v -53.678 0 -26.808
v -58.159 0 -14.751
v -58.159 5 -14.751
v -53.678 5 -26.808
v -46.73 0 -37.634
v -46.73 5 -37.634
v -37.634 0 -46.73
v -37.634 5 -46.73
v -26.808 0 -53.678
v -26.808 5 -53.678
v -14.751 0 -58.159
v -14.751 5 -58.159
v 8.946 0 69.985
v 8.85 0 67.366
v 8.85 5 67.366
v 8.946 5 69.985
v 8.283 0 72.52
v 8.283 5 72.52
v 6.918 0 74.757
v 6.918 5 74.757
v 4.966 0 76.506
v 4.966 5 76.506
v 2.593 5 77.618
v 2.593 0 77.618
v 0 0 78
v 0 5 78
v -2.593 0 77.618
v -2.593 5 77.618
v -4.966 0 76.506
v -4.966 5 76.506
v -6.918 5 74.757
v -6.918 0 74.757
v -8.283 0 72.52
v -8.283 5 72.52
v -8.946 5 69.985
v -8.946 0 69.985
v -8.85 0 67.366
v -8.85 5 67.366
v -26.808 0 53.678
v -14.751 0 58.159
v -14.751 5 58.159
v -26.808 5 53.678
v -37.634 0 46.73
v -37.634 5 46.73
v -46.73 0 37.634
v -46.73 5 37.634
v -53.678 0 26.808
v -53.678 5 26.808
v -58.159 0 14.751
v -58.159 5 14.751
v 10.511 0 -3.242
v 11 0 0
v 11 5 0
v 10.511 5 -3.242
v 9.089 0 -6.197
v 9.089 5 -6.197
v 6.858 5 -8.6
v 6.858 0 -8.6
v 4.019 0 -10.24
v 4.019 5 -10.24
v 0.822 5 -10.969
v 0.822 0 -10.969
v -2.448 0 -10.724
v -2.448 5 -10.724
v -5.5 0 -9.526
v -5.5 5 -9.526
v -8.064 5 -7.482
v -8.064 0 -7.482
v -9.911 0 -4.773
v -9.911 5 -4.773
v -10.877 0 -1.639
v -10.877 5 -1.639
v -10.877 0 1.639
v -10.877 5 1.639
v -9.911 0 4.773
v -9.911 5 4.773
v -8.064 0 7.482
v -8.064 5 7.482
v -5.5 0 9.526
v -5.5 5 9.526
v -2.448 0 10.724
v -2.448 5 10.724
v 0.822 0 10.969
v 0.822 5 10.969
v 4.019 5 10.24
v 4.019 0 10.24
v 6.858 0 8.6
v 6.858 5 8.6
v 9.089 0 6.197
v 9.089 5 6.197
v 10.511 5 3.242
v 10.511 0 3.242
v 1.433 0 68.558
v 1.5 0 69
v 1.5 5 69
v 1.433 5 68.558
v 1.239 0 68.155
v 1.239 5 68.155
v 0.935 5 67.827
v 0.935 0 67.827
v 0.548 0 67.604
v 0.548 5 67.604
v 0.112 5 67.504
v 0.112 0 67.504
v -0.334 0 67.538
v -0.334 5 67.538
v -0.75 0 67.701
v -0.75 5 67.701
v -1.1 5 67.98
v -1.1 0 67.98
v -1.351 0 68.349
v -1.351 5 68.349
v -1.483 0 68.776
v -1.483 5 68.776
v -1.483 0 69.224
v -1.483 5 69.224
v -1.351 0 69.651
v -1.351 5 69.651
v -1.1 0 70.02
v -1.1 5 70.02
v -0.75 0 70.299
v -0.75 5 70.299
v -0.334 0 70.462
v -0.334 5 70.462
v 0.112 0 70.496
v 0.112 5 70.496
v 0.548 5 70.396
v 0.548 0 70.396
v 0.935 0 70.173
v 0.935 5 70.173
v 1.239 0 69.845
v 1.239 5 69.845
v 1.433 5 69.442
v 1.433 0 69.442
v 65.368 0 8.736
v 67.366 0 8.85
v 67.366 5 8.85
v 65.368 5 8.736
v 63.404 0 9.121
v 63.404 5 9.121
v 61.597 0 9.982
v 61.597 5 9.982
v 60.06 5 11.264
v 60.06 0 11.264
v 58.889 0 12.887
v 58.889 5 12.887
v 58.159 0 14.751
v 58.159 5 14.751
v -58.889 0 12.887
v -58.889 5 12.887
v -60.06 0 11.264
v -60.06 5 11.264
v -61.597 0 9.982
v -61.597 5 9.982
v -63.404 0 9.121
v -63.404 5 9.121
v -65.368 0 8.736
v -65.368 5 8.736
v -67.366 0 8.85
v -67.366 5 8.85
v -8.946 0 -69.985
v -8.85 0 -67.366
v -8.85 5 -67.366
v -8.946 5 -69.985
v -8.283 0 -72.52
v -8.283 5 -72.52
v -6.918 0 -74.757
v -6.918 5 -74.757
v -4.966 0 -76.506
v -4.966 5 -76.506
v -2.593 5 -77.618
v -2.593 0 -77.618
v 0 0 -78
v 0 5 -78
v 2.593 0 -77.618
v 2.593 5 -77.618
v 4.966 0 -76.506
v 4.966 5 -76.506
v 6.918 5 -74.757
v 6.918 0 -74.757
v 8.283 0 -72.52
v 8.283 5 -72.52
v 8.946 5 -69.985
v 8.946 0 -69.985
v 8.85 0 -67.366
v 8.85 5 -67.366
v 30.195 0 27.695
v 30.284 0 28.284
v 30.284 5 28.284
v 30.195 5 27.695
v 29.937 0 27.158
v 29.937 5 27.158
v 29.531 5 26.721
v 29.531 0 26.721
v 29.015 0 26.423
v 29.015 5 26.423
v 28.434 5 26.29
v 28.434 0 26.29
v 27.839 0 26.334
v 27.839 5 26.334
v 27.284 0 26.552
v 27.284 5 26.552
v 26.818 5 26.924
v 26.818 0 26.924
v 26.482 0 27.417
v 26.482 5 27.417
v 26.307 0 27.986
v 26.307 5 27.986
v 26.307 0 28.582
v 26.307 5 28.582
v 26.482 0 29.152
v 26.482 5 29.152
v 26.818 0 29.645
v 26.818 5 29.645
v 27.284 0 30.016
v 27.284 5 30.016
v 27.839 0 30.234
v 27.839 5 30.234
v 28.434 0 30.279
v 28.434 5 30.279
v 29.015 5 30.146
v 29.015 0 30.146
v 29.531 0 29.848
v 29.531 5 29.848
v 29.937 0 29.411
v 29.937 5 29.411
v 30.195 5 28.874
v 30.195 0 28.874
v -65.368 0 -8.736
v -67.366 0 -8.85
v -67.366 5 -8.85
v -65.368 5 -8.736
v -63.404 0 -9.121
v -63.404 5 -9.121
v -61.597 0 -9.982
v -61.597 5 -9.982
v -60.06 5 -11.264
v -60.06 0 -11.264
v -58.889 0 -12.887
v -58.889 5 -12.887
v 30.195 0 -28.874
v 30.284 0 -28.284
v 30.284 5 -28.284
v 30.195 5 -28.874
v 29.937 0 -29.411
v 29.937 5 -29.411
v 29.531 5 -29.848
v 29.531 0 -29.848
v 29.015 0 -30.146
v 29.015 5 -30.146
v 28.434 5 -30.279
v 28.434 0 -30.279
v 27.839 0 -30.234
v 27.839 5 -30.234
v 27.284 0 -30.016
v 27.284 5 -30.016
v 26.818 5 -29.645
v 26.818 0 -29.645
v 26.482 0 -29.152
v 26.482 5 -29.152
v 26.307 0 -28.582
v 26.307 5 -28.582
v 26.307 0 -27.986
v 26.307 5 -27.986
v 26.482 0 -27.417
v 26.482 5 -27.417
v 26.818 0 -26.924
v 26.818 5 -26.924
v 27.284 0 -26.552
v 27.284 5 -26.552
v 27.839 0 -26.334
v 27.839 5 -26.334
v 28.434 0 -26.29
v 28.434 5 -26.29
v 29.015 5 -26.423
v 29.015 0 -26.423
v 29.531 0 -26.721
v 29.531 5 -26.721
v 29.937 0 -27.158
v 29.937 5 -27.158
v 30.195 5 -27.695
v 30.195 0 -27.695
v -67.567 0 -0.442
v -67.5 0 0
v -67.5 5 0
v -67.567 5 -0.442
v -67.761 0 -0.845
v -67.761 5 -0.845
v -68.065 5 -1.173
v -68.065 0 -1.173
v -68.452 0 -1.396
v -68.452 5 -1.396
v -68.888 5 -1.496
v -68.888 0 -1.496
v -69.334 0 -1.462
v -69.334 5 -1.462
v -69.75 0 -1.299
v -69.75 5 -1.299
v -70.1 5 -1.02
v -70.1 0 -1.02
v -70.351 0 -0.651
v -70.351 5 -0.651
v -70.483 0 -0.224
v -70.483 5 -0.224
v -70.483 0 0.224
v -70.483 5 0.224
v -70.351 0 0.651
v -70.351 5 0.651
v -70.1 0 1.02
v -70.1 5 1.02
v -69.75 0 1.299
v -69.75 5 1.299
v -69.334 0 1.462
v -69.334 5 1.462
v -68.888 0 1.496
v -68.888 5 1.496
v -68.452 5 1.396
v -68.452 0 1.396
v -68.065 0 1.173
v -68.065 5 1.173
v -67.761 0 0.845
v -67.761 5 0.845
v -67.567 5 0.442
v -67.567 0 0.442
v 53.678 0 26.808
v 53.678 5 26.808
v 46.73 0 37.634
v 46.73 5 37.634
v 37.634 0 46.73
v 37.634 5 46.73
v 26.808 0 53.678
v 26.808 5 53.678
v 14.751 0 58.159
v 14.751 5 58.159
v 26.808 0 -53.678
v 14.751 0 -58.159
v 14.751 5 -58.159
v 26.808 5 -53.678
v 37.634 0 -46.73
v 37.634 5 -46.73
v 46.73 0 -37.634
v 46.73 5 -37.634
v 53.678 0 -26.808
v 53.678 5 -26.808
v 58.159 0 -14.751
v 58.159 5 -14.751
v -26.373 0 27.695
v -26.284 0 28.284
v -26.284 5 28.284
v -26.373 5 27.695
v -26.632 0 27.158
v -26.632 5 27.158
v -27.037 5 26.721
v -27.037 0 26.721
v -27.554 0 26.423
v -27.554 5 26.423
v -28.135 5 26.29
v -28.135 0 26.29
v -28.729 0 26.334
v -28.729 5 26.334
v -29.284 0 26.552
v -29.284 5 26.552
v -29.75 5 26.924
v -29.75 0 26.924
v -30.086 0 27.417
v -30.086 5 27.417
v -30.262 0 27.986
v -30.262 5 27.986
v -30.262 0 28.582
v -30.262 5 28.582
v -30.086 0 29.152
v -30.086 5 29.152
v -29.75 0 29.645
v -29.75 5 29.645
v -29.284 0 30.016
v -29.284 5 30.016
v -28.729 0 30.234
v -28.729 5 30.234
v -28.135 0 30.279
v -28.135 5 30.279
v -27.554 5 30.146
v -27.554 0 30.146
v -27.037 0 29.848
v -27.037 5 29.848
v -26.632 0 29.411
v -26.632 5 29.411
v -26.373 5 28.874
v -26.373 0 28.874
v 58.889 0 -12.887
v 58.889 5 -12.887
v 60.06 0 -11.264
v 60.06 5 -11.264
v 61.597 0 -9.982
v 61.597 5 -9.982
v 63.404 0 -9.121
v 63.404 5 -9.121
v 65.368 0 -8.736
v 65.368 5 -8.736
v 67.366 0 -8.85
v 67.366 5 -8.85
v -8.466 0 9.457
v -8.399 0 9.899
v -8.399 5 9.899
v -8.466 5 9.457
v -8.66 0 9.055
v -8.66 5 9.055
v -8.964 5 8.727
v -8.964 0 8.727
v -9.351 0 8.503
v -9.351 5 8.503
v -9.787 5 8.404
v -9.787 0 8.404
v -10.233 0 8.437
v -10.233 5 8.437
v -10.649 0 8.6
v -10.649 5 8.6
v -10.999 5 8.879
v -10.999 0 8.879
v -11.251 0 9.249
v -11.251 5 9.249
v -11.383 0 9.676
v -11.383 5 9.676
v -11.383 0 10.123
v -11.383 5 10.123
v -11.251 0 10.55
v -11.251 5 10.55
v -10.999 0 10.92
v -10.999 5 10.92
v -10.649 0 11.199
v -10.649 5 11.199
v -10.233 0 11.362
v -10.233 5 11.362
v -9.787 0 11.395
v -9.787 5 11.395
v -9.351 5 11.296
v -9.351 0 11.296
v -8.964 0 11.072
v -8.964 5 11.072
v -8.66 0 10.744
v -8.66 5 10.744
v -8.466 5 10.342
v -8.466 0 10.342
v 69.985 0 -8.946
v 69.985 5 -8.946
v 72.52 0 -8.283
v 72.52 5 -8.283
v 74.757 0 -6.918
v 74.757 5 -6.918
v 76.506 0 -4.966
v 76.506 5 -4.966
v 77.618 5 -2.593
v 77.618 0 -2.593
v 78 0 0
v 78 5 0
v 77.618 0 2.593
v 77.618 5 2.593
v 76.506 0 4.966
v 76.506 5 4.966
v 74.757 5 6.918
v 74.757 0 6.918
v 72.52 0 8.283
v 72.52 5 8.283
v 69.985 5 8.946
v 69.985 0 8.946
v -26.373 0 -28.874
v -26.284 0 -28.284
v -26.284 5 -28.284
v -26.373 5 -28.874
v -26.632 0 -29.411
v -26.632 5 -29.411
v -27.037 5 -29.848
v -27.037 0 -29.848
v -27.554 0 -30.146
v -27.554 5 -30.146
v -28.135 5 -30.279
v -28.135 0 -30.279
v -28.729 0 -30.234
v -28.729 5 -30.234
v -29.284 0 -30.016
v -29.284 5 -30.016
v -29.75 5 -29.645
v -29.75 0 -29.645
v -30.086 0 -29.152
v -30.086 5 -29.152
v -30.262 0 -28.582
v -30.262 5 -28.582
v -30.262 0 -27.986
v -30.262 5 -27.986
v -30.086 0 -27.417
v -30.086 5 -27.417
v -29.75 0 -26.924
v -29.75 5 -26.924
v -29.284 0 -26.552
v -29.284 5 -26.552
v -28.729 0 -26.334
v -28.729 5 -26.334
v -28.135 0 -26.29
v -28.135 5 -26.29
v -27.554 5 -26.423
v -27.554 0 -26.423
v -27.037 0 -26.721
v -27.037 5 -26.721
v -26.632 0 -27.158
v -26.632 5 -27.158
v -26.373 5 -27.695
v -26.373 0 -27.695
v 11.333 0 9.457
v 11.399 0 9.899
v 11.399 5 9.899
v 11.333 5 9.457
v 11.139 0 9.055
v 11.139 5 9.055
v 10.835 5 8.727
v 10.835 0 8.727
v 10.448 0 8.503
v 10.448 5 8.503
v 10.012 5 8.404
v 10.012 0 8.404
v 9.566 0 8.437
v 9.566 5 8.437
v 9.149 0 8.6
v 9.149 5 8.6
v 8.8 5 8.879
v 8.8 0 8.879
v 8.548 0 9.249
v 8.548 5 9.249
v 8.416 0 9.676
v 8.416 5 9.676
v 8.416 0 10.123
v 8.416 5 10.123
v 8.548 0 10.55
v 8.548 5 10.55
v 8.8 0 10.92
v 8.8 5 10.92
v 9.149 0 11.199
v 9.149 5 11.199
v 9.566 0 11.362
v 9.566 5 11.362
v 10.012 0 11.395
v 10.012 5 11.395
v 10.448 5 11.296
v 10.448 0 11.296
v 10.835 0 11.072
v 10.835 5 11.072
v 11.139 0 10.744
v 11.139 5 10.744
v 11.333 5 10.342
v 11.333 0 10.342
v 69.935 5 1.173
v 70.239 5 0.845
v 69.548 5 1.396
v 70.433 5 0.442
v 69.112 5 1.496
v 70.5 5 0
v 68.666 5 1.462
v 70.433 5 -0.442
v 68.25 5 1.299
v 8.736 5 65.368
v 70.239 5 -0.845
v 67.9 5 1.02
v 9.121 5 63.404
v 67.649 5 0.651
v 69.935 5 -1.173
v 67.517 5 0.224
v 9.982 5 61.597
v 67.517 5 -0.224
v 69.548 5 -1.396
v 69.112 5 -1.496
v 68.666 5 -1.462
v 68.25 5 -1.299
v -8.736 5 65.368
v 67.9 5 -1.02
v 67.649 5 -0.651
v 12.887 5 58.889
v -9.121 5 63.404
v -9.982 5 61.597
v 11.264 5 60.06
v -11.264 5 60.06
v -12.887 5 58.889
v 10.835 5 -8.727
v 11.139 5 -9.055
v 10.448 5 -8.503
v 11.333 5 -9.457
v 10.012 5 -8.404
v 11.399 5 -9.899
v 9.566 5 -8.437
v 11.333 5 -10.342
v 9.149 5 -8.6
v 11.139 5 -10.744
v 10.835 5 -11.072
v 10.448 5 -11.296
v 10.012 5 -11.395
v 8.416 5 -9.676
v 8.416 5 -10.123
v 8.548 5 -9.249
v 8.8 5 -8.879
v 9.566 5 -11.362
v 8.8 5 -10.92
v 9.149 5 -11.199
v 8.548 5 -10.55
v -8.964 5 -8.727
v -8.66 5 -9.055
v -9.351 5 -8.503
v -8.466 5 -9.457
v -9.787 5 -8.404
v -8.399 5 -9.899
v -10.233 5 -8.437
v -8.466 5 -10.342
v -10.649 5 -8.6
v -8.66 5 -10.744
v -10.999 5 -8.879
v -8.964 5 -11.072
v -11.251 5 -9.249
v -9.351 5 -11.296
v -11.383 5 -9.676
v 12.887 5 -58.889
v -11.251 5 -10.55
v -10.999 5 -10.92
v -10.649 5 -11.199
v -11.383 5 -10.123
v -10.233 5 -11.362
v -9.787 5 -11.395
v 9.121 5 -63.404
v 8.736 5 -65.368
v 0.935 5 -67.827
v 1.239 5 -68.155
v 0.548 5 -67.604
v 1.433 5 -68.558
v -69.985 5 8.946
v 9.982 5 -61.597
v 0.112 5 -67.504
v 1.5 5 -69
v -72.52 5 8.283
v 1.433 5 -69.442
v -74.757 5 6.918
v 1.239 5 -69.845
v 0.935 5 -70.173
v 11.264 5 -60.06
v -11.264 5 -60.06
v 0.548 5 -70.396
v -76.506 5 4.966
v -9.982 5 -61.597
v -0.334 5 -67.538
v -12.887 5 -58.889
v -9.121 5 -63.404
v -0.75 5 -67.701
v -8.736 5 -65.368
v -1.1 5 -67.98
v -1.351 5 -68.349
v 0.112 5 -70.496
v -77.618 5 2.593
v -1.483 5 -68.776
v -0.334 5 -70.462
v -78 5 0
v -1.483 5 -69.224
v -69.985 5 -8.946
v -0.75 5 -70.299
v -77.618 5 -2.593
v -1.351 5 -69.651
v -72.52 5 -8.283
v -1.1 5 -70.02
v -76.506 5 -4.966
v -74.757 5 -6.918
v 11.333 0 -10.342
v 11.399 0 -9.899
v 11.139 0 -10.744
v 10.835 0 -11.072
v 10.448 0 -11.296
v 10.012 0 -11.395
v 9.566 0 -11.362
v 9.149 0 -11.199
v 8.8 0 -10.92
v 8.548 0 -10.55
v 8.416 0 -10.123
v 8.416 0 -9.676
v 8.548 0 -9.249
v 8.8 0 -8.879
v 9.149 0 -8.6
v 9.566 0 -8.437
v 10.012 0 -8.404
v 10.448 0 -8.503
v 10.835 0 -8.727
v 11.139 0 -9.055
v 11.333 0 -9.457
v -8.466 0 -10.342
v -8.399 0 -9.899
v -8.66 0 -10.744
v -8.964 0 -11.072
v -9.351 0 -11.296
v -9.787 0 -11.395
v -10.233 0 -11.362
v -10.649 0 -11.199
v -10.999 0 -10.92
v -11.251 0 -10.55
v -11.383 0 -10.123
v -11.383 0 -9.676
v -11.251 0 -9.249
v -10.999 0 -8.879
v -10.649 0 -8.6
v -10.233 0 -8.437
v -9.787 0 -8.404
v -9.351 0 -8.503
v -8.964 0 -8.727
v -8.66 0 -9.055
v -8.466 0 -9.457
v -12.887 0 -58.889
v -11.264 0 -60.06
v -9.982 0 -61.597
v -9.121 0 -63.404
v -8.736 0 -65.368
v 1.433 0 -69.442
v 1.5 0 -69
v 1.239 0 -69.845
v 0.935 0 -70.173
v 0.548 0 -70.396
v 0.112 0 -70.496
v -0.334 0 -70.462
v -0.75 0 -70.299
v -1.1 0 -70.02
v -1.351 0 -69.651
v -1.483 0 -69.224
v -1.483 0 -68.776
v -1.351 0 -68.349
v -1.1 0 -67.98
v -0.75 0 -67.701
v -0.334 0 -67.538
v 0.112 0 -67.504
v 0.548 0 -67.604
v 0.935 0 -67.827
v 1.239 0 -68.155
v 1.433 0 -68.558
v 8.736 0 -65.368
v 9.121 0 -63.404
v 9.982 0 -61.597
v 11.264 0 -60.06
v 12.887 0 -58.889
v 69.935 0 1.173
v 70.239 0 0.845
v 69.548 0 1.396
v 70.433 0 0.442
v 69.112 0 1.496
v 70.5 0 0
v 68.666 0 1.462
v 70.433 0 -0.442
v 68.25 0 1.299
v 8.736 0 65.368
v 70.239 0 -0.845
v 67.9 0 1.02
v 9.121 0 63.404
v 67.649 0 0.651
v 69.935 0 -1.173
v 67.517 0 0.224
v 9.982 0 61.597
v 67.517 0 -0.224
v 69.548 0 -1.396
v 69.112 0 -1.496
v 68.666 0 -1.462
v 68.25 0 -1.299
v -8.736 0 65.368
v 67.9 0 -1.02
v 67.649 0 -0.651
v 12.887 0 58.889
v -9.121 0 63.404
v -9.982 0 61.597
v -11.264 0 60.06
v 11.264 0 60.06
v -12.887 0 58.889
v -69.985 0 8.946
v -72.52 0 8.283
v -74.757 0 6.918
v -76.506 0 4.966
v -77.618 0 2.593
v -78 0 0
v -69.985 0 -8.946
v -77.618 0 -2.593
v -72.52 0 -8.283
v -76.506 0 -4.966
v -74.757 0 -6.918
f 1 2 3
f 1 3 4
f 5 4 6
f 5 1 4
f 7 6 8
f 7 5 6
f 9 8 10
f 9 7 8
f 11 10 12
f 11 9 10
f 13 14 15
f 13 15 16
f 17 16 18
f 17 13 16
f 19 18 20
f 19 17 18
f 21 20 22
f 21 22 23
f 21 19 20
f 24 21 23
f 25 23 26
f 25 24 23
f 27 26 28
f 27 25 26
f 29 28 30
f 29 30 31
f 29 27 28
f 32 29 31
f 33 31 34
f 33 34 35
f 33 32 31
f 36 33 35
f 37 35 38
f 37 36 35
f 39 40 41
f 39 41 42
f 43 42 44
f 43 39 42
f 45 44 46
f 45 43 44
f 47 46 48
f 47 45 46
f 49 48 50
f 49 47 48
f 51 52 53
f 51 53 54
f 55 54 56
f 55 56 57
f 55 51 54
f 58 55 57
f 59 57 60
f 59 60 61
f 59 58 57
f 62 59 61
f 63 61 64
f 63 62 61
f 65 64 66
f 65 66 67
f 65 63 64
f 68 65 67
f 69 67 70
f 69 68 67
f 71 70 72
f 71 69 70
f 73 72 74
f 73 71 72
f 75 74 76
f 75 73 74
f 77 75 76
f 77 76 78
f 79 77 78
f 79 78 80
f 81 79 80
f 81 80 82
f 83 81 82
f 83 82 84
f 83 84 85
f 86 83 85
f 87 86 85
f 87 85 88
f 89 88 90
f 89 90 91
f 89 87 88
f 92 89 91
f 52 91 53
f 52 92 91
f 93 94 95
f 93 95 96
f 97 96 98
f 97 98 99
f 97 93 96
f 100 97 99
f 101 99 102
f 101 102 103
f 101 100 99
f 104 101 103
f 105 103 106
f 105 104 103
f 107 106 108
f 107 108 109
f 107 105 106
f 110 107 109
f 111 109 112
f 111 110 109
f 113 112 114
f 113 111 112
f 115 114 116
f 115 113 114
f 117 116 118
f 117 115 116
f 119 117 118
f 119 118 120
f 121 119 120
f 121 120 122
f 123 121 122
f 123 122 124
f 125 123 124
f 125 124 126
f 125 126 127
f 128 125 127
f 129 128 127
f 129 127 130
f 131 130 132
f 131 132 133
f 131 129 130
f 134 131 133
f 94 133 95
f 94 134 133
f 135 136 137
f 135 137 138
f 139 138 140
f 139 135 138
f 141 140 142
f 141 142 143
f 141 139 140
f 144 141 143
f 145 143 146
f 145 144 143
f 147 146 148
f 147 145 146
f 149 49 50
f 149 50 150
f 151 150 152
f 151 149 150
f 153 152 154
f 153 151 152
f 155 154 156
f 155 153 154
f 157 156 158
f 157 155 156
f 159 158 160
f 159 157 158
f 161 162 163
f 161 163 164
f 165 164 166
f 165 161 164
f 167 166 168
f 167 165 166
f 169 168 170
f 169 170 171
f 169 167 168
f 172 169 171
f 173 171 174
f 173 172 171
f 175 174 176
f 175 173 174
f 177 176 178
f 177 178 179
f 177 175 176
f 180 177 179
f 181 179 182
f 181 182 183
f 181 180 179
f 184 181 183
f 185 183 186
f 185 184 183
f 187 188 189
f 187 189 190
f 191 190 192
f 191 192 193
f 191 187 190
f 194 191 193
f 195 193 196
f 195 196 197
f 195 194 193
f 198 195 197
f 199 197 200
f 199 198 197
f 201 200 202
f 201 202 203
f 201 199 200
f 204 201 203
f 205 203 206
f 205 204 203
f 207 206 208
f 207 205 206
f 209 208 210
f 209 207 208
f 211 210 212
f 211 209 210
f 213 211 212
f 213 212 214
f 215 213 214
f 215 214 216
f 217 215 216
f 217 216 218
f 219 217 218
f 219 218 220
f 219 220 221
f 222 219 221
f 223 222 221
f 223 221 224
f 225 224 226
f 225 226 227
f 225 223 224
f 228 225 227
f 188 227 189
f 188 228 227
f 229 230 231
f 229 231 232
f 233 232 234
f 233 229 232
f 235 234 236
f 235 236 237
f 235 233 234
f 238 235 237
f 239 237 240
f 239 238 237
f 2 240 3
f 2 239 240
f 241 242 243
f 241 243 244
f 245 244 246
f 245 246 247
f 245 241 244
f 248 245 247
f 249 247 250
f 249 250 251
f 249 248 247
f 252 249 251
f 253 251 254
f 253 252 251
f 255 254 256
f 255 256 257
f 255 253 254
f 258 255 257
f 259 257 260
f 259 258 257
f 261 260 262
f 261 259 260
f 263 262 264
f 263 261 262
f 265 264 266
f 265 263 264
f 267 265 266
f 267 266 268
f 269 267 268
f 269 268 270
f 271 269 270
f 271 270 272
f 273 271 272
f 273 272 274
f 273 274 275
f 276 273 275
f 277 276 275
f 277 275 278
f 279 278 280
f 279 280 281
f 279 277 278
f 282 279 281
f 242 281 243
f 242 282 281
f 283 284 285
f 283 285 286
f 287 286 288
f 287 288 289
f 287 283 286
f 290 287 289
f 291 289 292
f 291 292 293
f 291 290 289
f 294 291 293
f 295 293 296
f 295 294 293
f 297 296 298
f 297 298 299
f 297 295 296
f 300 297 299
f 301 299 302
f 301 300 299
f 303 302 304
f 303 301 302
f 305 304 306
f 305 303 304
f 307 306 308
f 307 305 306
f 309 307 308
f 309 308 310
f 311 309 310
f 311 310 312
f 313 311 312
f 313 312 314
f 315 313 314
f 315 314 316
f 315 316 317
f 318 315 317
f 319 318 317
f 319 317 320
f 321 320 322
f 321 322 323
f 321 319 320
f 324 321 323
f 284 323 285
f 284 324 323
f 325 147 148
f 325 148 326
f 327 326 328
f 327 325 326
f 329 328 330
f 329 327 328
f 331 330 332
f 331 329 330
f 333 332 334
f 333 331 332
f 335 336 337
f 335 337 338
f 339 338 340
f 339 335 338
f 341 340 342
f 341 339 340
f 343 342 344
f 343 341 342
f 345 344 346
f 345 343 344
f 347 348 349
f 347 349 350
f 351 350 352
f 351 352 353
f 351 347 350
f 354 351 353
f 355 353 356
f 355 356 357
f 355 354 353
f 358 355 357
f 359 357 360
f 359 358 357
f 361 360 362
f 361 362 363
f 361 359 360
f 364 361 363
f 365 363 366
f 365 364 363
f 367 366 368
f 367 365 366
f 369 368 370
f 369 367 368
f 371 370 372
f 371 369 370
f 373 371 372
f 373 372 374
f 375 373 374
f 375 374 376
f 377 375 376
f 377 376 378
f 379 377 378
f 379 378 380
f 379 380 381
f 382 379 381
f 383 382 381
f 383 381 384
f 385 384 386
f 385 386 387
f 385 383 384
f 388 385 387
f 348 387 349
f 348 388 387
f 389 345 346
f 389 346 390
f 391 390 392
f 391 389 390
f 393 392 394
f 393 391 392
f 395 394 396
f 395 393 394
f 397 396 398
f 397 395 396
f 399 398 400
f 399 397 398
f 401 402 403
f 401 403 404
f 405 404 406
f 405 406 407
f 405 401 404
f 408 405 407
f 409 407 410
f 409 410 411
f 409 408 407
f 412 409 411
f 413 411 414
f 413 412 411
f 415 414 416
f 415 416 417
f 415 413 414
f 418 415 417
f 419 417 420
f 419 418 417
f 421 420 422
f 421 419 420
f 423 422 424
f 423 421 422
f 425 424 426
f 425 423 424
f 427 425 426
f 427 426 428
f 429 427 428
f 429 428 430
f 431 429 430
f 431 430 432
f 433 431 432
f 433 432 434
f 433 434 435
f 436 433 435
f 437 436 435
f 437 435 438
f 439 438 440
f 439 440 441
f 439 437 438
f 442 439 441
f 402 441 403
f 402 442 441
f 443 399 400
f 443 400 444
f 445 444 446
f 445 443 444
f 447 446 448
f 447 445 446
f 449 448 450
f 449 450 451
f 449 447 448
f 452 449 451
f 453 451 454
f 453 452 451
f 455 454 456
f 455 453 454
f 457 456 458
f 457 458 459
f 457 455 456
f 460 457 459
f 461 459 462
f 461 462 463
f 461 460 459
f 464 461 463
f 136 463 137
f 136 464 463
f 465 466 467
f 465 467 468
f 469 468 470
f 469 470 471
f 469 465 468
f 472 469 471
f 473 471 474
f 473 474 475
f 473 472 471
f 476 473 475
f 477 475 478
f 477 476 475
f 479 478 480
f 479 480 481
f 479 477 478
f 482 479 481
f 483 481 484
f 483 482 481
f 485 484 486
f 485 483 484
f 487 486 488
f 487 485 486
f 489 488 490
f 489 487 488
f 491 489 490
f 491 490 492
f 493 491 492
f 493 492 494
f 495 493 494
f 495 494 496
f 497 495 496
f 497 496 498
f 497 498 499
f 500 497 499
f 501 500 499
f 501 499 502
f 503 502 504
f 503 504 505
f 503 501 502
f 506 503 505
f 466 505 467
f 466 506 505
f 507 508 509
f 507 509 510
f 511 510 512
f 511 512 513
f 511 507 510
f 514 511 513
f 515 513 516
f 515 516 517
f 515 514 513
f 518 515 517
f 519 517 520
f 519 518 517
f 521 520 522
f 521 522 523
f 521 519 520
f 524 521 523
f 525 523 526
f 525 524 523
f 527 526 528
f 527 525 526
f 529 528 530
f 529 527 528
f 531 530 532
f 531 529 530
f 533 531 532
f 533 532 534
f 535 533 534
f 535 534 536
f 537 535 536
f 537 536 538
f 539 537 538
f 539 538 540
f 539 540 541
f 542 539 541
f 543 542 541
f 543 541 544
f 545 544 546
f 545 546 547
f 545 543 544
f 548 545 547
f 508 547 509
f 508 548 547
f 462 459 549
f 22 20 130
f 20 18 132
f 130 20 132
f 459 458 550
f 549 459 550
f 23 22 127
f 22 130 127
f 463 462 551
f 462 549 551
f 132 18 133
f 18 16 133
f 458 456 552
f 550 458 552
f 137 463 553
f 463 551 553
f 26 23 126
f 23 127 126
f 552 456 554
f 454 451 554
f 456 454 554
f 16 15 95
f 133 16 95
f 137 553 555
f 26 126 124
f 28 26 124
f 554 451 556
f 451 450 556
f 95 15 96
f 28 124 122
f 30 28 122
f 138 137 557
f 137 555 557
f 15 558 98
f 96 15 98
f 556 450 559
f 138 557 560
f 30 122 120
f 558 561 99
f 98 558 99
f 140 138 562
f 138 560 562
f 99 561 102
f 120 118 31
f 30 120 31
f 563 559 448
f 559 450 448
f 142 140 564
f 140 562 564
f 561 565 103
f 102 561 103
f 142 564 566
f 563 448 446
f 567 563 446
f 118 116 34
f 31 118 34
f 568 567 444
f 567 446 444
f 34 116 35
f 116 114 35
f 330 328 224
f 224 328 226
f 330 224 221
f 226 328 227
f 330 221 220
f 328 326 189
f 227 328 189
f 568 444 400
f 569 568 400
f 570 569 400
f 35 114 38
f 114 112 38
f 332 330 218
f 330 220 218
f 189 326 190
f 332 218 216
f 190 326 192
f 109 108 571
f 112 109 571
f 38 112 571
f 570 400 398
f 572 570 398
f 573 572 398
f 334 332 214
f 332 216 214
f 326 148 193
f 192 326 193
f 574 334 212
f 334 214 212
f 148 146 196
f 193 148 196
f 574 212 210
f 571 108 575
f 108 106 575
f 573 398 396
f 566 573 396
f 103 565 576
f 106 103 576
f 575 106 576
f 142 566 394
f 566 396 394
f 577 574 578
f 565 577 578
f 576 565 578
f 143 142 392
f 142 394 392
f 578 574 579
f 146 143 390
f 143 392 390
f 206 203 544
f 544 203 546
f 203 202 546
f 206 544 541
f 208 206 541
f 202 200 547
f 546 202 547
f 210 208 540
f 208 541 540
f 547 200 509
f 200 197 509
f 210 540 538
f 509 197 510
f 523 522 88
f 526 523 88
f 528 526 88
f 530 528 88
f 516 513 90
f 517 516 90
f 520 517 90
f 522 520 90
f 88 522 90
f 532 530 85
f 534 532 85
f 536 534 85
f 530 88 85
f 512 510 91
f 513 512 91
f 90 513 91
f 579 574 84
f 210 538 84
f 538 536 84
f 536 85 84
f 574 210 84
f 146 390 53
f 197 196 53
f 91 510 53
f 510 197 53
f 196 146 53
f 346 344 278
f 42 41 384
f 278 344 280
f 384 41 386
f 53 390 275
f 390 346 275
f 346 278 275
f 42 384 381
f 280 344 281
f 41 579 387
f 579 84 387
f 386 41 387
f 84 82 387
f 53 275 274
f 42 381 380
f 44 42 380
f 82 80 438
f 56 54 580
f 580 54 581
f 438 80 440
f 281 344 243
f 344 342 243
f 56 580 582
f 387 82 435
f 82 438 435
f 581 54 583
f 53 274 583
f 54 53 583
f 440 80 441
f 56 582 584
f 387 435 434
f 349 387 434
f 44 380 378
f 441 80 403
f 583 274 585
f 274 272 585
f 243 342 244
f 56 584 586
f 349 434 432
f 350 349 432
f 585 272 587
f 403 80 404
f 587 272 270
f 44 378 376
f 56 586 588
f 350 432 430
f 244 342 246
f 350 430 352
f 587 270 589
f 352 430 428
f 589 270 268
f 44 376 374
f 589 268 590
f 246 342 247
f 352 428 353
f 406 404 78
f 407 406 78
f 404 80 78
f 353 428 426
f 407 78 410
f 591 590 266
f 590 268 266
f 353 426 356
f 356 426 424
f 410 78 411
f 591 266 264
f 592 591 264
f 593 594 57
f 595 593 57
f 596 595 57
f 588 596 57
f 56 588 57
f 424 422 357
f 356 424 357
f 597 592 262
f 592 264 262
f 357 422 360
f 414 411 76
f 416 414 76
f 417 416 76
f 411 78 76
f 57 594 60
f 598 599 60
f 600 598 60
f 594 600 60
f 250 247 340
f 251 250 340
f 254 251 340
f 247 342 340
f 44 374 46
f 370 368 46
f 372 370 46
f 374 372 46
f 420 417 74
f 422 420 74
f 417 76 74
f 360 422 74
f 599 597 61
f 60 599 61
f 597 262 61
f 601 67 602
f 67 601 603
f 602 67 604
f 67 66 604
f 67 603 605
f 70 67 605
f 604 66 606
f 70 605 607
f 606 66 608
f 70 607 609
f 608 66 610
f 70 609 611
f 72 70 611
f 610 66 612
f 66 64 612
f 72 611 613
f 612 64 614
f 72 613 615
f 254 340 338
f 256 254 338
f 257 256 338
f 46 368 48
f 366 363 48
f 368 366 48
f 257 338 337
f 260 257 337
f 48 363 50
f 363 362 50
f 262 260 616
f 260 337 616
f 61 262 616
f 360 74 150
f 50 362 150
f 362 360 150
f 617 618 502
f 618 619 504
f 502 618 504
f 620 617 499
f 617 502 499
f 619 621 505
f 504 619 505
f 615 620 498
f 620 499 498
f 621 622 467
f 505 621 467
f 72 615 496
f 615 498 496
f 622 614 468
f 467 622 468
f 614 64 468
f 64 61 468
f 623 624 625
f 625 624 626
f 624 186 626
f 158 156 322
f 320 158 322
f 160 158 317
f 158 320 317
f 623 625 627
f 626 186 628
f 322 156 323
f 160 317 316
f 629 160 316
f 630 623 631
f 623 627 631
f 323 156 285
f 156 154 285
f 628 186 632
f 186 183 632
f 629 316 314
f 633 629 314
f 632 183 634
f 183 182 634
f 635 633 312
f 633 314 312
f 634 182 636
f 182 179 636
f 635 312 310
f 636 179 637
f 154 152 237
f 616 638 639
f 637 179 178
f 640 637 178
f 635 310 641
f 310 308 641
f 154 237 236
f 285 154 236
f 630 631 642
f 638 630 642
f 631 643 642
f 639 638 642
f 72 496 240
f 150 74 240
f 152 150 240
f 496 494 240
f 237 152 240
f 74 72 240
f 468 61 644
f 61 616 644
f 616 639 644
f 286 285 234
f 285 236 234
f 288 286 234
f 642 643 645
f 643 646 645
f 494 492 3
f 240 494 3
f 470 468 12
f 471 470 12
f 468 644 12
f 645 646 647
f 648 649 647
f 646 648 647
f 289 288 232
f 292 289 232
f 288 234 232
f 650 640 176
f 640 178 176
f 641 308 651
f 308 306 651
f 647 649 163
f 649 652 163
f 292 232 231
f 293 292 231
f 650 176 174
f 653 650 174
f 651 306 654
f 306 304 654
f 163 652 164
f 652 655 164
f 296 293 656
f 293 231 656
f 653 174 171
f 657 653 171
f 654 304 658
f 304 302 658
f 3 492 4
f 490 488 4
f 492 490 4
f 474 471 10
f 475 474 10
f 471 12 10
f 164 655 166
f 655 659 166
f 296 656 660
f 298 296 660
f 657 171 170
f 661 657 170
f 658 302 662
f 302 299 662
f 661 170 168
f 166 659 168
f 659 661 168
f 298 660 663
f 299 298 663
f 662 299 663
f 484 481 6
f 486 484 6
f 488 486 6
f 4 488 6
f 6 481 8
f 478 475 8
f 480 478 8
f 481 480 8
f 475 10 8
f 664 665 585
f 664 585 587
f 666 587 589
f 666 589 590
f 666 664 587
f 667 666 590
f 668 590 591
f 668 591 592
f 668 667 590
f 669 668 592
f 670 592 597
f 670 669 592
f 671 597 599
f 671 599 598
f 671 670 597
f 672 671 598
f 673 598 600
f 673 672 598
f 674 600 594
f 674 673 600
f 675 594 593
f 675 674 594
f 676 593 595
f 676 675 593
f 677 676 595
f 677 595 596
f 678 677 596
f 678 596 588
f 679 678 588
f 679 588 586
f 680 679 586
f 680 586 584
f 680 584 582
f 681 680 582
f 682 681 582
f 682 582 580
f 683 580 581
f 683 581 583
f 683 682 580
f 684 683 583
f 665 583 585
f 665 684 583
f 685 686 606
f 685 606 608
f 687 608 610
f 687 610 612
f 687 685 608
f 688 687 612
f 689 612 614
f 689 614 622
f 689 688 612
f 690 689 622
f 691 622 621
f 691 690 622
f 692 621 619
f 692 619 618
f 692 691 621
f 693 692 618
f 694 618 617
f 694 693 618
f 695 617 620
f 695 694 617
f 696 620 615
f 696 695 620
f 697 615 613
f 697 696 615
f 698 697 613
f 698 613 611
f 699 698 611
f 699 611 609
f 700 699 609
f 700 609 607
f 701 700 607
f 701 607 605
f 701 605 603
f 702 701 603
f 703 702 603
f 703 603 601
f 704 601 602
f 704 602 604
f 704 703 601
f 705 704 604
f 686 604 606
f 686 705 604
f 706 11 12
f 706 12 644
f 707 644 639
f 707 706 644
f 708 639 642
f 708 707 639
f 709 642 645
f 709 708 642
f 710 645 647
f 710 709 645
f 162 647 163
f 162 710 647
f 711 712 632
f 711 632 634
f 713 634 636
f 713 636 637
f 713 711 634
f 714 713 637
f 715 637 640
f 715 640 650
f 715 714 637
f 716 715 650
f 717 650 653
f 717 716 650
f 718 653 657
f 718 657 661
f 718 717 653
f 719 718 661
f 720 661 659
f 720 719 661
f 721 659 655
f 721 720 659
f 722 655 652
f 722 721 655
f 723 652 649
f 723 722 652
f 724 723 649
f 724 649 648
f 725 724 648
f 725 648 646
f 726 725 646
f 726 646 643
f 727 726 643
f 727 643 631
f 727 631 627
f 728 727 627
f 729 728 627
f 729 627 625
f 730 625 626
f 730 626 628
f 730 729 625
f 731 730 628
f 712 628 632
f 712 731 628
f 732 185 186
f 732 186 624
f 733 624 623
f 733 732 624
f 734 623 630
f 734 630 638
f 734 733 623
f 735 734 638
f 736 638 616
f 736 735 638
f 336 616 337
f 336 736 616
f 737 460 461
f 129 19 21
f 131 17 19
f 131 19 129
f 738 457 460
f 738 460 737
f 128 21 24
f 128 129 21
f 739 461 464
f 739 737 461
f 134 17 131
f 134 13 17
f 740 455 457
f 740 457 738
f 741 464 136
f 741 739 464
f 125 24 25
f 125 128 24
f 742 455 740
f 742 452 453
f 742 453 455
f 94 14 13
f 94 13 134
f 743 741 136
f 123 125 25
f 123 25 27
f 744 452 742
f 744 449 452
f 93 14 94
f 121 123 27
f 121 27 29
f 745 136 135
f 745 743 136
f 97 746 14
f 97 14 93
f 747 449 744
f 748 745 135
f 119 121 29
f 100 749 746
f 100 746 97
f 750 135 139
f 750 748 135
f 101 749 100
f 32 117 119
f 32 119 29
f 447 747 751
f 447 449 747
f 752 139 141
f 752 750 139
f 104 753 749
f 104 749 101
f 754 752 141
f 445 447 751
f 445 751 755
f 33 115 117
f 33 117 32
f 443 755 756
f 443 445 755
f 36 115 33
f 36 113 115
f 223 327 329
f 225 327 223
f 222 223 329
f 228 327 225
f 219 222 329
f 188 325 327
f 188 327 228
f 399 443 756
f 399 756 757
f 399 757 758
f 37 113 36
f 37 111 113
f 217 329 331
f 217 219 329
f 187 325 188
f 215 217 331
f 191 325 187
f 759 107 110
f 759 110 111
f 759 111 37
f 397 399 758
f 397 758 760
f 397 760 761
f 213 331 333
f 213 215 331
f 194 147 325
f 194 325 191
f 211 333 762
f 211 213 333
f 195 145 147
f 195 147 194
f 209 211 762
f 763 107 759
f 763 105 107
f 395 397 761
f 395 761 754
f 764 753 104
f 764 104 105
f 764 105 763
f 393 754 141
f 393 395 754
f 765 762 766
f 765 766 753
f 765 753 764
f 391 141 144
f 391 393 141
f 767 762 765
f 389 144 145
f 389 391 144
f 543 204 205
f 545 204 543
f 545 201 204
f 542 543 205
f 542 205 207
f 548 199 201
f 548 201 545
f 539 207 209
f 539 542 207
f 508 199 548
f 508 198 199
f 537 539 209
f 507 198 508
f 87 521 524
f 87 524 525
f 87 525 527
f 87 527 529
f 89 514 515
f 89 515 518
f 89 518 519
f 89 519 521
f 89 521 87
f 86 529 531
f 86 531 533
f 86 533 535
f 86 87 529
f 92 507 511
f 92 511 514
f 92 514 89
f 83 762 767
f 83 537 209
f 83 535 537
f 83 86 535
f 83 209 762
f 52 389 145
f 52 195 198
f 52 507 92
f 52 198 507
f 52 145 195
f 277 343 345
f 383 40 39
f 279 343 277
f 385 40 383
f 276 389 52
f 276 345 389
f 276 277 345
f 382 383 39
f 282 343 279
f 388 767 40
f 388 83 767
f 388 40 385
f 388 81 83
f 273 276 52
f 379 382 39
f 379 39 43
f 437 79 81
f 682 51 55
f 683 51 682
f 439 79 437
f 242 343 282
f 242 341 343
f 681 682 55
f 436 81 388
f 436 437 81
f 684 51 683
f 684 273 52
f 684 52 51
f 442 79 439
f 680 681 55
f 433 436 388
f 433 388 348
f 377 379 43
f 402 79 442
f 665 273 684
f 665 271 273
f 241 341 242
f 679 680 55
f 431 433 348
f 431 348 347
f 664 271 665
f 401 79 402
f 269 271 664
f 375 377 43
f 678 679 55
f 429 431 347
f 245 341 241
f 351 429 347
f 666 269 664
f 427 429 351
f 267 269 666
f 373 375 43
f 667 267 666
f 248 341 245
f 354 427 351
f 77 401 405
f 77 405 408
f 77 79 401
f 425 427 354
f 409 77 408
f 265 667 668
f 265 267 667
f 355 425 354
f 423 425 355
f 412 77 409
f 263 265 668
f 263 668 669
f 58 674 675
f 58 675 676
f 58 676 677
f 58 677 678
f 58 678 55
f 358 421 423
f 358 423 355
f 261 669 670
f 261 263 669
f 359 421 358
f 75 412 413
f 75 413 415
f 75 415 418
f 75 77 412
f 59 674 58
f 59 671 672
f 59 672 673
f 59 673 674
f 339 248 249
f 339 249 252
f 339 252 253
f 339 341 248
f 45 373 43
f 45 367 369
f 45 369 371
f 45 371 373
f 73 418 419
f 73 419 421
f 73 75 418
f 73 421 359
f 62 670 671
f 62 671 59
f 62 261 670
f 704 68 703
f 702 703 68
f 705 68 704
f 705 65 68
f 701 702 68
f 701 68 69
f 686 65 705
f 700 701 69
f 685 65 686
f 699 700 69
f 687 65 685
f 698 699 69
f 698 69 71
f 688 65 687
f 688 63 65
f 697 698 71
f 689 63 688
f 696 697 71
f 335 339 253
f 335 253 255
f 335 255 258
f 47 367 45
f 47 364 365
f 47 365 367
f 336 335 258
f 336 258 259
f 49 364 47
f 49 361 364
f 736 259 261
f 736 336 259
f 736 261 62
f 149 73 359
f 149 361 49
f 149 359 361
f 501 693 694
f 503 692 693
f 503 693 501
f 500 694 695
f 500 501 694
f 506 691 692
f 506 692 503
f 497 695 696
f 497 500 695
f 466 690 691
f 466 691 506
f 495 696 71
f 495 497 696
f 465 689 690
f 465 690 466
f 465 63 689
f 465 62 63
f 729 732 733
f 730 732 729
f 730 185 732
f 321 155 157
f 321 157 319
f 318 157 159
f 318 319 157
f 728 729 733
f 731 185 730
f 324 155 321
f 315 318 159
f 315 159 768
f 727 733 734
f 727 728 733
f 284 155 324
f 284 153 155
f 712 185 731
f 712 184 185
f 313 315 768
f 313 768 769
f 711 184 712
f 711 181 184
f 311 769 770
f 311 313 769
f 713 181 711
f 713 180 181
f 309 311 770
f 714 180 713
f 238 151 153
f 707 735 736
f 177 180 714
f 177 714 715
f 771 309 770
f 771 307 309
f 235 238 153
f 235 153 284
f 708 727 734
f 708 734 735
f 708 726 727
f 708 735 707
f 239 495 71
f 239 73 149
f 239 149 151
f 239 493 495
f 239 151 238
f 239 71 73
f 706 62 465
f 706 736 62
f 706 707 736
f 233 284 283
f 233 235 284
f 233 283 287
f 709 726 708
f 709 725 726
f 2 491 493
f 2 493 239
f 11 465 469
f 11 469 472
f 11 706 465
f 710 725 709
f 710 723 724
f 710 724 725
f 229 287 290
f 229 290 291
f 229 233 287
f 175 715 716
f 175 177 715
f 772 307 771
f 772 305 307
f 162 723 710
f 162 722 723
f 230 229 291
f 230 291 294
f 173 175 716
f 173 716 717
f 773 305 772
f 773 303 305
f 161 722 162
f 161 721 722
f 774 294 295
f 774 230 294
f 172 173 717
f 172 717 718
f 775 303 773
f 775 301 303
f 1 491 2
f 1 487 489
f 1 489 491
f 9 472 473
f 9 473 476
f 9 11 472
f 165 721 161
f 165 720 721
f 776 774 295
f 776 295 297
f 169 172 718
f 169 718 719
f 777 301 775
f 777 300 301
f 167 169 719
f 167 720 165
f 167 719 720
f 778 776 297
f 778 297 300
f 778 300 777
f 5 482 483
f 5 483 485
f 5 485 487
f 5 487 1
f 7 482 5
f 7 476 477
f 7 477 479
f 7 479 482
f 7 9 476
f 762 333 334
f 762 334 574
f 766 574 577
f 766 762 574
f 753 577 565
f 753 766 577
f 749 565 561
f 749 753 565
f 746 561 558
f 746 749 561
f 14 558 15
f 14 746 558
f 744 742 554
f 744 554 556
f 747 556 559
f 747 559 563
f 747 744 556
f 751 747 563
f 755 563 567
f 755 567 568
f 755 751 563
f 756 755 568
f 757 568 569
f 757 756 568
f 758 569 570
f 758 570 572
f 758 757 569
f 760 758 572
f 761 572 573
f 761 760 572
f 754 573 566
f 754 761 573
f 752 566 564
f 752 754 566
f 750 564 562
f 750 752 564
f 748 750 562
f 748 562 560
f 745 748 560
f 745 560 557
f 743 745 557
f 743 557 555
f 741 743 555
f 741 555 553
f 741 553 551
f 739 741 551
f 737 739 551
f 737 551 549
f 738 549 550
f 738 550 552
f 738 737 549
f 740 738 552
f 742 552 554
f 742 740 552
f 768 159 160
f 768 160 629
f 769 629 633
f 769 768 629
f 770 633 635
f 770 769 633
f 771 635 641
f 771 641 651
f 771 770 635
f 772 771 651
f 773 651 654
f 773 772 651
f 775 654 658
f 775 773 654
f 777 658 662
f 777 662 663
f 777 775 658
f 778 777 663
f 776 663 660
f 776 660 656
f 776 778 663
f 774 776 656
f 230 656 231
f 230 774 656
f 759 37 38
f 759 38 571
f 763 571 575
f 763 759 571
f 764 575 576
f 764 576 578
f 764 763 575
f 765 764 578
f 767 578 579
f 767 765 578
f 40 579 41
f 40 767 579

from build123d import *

# Parameters (mm, degrees)
SKETCH1_R           = 1.5
SKETCH1_R_2         = 11
SKETCH1_R_3         = 2
BOSS_EXTRUDE1_DEPTH = 5


with BuildPart() as part:
    # Sketch1 → Boss-Extrude1 (new body)
    with BuildSketch(Plane(origin=(0, 0, 0), x_dir=(1, 0, 0), z_dir=(0, 1, 0))):
        with BuildLine():
            ThreePointArc((14.750626914, -58.158567775), (9.981753959, -61.596635254), (8.850376149, -67.3657289))
            ThreePointArc((8.850376149, -67.3657289), (0, -78), (-8.850376149, -67.3657289))
            ThreePointArc((-8.850376149, -67.3657289), (-9.981753959, -61.596635254), (-14.750626914, -58.158567775))
            ThreePointArc((-14.750626914, -58.158567775), (-42.426406871, -42.426406871), (-58.158567775, -14.750626914))
            ThreePointArc((-58.158567775, -14.750626914), (-61.596635254, -9.981753959), (-67.3657289, -8.850376149))
            ThreePointArc((-67.3657289, -8.850376149), (-78, 0), (-67.3657289, 8.850376149))
            ThreePointArc((-67.3657289, 8.850376149), (-61.596635254, 9.981753959), (-58.158567775, 14.750626914))
            ThreePointArc((-58.158567775, 14.750626914), (-42.426406871, 42.426406871), (-14.750626914, 58.158567775))
            ThreePointArc((-14.750626914, 58.158567775), (-9.981753959, 61.596635254), (-8.850376149, 67.3657289))
            ThreePointArc((-8.850376149, 67.3657289), (0, 78), (8.850376149, 67.3657289))
            ThreePointArc((8.850376149, 67.3657289), (9.981753959, 61.596635254), (14.750626914, 58.158567775))
            ThreePointArc((14.750626914, 58.158567775), (42.426406871, 42.426406871), (58.158567775, 14.750626914))
            ThreePointArc((58.158567775, 14.750626914), (61.596635254, 9.981753959), (67.3657289, 8.850376149))
            ThreePointArc((67.3657289, 8.850376149), (78, 0), (67.3657289, -8.850376149))
            ThreePointArc((67.3657289, -8.850376149), (61.596635254, -9.981753959), (58.158567775, -14.750626914))
            ThreePointArc((58.158567775, -14.750626914), (42.426406871, -42.426406871), (14.750626914, -58.158567775))
        make_face()
        with Locations((0, -69)):
            Circle(SKETCH1_R, mode=Mode.SUBTRACT)
        with Locations((-69, 0)):
            Circle(SKETCH1_R, mode=Mode.SUBTRACT)
        with Locations((0, 69)):
            Circle(SKETCH1_R, mode=Mode.SUBTRACT)
        with Locations((69, 0)):
            Circle(SKETCH1_R, mode=Mode.SUBTRACT)
        Circle(SKETCH1_R_2, mode=Mode.SUBTRACT)
        with Locations((9.899494937, 9.899494937)):
            Circle(SKETCH1_R, mode=Mode.SUBTRACT)
        with Locations((9.899494937, -9.899494937)):
            Circle(SKETCH1_R, mode=Mode.SUBTRACT)
        with Locations((-9.899494937, -9.899494937)):
            Circle(SKETCH1_R, mode=Mode.SUBTRACT)
        with Locations((-9.899494937, 9.899494937)):
            Circle(SKETCH1_R, mode=Mode.SUBTRACT)
        with Locations((28.284271247, 28.284271247)):
            Circle(SKETCH1_R_3, mode=Mode.SUBTRACT)
        with Locations((28.284271247, -28.284271247)):
            Circle(SKETCH1_R_3, mode=Mode.SUBTRACT)
        with Locations((-28.284271247, -28.284271247)):
            Circle(SKETCH1_R_3, mode=Mode.SUBTRACT)
        with Locations((-28.284271247, 28.284271247)):
            Circle(SKETCH1_R_3, mode=Mode.SUBTRACT)
    extrude(amount=BOSS_EXTRUDE1_DEPTH)


solid = part.part
